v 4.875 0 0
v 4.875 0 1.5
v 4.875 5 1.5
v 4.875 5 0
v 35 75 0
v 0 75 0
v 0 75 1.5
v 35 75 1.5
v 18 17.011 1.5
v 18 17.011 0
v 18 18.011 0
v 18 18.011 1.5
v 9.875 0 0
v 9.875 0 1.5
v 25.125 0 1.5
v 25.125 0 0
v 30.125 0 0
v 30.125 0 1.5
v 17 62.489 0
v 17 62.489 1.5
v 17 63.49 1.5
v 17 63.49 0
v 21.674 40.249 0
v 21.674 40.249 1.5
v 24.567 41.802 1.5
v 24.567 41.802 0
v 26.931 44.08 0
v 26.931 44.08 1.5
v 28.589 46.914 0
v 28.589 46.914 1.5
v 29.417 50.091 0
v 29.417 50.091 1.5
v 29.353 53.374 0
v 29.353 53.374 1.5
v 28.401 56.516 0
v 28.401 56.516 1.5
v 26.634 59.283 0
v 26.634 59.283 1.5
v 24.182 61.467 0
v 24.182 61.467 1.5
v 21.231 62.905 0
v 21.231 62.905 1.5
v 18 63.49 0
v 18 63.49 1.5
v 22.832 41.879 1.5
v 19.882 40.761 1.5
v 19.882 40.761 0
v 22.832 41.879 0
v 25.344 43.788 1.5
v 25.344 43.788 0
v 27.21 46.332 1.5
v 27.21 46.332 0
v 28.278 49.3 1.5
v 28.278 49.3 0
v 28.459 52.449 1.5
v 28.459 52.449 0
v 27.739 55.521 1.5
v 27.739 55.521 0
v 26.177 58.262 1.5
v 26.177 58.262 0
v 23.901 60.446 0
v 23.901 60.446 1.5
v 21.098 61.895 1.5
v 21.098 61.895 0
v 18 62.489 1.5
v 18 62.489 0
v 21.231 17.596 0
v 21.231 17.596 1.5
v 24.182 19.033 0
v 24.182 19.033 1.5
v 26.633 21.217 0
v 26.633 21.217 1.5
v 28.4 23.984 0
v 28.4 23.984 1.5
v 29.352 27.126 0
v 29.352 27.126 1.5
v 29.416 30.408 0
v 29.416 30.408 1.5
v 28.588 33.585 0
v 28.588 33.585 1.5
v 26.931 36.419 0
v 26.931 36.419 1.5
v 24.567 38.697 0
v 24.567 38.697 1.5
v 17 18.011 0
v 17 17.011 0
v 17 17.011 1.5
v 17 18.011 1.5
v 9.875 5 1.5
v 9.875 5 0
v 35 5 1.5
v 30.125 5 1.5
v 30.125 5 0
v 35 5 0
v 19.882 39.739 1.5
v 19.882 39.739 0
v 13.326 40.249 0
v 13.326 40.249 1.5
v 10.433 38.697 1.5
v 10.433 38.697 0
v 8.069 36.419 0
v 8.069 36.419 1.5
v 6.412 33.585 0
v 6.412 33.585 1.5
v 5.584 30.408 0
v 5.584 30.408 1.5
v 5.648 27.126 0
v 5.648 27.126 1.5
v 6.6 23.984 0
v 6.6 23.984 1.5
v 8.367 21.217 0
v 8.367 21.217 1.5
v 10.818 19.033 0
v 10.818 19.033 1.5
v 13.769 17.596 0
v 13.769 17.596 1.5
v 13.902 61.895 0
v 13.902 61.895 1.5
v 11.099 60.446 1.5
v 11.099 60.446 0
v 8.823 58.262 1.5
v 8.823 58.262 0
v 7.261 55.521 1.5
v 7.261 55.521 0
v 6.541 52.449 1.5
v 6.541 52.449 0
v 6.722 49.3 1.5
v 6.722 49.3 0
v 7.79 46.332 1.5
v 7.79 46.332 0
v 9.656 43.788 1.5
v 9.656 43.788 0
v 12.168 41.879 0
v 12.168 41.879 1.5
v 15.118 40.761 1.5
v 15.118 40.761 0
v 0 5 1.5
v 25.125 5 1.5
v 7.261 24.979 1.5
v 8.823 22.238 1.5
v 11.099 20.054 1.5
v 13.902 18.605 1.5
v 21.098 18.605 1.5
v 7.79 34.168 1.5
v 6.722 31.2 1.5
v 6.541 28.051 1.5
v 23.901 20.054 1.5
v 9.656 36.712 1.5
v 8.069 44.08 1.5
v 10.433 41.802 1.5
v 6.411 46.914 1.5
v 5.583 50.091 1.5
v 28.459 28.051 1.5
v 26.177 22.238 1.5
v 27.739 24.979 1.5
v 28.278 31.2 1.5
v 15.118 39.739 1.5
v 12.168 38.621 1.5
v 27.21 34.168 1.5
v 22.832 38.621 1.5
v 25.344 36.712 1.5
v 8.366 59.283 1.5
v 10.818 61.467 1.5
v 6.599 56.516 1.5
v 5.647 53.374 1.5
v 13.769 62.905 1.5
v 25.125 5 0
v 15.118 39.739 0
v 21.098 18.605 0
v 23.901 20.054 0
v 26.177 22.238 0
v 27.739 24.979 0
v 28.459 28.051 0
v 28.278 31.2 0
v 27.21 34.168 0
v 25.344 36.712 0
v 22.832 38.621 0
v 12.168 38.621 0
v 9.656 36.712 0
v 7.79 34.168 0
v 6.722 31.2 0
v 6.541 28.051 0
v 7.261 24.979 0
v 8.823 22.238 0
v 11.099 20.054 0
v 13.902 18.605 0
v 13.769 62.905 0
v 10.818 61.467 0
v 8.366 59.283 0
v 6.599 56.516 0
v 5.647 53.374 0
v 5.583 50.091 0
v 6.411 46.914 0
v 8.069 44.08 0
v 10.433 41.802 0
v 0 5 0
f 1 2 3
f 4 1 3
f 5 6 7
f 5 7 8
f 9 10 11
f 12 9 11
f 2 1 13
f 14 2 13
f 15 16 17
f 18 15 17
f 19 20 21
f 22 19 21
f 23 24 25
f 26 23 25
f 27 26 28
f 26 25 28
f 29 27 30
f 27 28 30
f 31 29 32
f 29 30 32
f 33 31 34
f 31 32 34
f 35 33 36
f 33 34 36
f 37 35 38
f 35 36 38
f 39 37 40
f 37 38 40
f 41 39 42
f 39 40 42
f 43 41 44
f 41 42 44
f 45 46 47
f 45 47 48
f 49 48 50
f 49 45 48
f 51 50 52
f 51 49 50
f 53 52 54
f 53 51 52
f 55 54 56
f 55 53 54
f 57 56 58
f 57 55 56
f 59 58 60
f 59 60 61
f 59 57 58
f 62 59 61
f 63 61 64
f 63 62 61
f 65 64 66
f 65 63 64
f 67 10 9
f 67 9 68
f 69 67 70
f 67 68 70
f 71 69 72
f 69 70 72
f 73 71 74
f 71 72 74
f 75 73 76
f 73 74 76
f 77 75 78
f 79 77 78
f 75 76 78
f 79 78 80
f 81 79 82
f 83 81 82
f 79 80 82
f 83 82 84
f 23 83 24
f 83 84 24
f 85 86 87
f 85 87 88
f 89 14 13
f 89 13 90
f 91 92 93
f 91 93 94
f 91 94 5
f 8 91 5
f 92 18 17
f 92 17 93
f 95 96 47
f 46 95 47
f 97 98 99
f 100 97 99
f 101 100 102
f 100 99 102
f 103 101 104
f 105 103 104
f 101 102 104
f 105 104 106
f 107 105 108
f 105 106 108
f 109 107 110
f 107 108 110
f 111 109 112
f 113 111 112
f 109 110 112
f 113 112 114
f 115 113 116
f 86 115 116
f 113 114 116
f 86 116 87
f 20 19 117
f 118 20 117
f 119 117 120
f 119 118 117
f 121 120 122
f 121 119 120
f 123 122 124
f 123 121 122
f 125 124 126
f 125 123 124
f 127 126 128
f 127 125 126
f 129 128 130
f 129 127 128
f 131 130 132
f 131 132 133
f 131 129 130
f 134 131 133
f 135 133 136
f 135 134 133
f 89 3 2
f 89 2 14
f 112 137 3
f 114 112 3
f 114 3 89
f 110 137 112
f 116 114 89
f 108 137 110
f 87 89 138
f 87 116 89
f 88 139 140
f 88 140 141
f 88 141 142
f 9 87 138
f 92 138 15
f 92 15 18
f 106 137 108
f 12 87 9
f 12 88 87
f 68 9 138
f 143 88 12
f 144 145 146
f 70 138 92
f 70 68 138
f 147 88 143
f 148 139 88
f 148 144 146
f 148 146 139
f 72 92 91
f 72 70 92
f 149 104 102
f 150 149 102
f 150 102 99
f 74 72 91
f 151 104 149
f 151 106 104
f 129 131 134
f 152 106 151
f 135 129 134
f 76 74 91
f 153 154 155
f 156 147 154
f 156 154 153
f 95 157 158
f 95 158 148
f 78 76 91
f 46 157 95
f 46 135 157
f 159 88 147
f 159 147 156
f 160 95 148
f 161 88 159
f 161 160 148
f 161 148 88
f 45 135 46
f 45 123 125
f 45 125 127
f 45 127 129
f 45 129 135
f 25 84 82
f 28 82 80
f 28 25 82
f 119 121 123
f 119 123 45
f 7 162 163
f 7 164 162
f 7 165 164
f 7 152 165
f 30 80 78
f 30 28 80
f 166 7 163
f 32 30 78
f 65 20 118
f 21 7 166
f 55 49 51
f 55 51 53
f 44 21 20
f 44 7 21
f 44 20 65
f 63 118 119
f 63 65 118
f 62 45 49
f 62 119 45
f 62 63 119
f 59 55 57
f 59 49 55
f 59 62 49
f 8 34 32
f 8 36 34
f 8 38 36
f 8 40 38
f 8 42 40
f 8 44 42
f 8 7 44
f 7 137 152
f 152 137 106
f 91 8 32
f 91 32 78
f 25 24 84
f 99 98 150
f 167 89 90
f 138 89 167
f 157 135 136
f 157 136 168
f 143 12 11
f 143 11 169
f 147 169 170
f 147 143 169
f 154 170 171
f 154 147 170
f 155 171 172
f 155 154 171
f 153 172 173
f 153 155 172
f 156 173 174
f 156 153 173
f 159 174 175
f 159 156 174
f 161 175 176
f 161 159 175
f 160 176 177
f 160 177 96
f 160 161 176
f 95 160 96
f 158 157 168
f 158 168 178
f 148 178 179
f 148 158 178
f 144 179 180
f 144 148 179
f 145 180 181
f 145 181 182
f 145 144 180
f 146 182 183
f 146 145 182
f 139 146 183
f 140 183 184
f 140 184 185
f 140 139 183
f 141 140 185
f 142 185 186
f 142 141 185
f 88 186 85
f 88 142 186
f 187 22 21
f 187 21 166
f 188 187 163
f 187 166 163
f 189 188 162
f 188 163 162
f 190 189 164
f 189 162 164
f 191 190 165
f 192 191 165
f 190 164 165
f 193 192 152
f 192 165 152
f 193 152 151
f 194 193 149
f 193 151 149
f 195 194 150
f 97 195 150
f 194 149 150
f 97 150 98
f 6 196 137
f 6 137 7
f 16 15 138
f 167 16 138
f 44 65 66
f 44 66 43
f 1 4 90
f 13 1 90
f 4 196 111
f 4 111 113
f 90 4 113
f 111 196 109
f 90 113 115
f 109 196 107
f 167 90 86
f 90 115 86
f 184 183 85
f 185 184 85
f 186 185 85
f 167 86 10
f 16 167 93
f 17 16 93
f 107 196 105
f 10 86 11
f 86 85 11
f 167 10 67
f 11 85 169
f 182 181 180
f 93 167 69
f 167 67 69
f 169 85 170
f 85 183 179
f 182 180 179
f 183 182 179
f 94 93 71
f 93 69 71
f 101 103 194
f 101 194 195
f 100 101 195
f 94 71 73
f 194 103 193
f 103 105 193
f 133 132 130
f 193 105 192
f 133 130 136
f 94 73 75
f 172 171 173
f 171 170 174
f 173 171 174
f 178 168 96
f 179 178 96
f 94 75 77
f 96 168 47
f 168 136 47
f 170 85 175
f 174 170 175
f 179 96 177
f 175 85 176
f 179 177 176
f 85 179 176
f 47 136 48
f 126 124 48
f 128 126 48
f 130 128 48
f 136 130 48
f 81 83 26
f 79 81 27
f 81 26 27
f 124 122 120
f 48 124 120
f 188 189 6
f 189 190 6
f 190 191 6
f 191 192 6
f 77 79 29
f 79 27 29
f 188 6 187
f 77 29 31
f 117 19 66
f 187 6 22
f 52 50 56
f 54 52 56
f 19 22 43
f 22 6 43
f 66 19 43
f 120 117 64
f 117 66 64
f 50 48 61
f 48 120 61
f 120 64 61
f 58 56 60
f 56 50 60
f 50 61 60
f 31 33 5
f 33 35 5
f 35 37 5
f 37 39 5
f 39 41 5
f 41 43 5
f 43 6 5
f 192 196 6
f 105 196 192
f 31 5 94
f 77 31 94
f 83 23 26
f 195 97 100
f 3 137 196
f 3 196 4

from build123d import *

# Parameters (mm, degrees)
SKIZZE1_W                        = 35
SKIZZE1_H                        = 75
AUFSATZ_LINEAR_AUSTRAGEN1_DEPTH  = 1.5
SKIZZE3_W                        = 15.25
SKIZZE3_H                        = 5
SKIZZE3_W_2                      = 4.875
SCHNITT_LINEAR_AUSTRAGEN12_DEPTH = 20
SCHNITT_LINEAR_AUSTRAGEN18_DEPTH = 1.5
SKIZZE14_W                       = 1
SKIZZE14_H                       = 57.312152727
AUFSATZ_LINEAR_AUSTRAGEN2_DEPTH  = 1.5


with BuildPart() as part:
    # Skizze1 → Aufsatz-Linear austragen1 (new body)
    with BuildSketch(Plane.XY):
        with Locations((17.5, 37.5)):
            Rectangle(SKIZZE1_W, SKIZZE1_H)
    extrude(amount=AUFSATZ_LINEAR_AUSTRAGEN1_DEPTH)

    # Skizze3 → Schnitt-Linear austragen12 (cut)
    with BuildSketch(Plane.XY.offset(1.5)):
        with Locations((17.5, 2.5)):
            Rectangle(SKIZZE3_W, SKIZZE3_H)
        with Locations((32.5625, 2.5)):
            Rectangle(SKIZZE3_W_2, SKIZZE3_H)
        with Locations((2.4375, 2.5)):
            Rectangle(SKIZZE3_W_2, SKIZZE3_H)
    extrude(amount=-SCHNITT_LINEAR_AUSTRAGEN12_DEPTH, mode=Mode.SUBTRACT)

    # Skizze13 → Schnitt-Linear austragen18 (cut)
    with BuildSketch(Plane.XY.offset(1.5)):
        with BuildLine():
            ThreePointArc((21.674459995, 40.249493876), (17.5, 63.500000179), (13.325540005, 40.249493876))
            ThreePointArc((13.325540005, 40.249493876), (17.5, 17.000948841), (21.674459995, 40.249493876))
        make_face()
        with BuildLine():
            Line((15.117508566, 40.761111111), (15.117508566, 39.738888889))
            ThreePointArc((15.117508566, 39.738888889), (17.5, 18), (19.882491434, 39.738888889))
            Line((19.882491434, 39.738888889), (19.882491434, 40.761111111))
            ThreePointArc((19.882491434, 40.761111111), (17.5, 62.5), (15.117508566, 40.761111111))
        make_face(mode=Mode.SUBTRACT)
    extrude(amount=-SCHNITT_LINEAR_AUSTRAGEN18_DEPTH, mode=Mode.SUBTRACT)


with BuildPart() as schnitt_linear_austragen18_piece_1:
    # of the separate pieces the step leaves, piece 1, a body of its own (schnitt_linear_austragen18_pieces)
    add(part.part.solids().sort_by_distance((4.875, 0, 0))[0])



with BuildPart() as schnitt_linear_austragen18_piece_2:
    # of the separate pieces the step leaves, piece 2, a body of its own (schnitt_linear_austragen18_pieces)
    add(part.part.solids().sort_by_distance((19.882491434, 39.738888889, 0))[0])


with BuildPart() as schnitt_linear_austragen18_piece_1_1:
    add(schnitt_linear_austragen18_piece_1.part)

    add(schnitt_linear_austragen18_piece_2.part)  # Aufsatz-Linear austragen2 merges Schnitt-Linear austragen18 piece 2
    # Skizze14 → Aufsatz-Linear austragen2 (add)
    with BuildSketch(Plane.XY.offset(1.5)):
        with Locations((17.5, 39.529651928)):
            Rectangle(SKIZZE14_W, SKIZZE14_H)
    extrude(amount=-AUFSATZ_LINEAR_AUSTRAGEN2_DEPTH)


solid = schnitt_linear_austragen18_piece_1_1.part
